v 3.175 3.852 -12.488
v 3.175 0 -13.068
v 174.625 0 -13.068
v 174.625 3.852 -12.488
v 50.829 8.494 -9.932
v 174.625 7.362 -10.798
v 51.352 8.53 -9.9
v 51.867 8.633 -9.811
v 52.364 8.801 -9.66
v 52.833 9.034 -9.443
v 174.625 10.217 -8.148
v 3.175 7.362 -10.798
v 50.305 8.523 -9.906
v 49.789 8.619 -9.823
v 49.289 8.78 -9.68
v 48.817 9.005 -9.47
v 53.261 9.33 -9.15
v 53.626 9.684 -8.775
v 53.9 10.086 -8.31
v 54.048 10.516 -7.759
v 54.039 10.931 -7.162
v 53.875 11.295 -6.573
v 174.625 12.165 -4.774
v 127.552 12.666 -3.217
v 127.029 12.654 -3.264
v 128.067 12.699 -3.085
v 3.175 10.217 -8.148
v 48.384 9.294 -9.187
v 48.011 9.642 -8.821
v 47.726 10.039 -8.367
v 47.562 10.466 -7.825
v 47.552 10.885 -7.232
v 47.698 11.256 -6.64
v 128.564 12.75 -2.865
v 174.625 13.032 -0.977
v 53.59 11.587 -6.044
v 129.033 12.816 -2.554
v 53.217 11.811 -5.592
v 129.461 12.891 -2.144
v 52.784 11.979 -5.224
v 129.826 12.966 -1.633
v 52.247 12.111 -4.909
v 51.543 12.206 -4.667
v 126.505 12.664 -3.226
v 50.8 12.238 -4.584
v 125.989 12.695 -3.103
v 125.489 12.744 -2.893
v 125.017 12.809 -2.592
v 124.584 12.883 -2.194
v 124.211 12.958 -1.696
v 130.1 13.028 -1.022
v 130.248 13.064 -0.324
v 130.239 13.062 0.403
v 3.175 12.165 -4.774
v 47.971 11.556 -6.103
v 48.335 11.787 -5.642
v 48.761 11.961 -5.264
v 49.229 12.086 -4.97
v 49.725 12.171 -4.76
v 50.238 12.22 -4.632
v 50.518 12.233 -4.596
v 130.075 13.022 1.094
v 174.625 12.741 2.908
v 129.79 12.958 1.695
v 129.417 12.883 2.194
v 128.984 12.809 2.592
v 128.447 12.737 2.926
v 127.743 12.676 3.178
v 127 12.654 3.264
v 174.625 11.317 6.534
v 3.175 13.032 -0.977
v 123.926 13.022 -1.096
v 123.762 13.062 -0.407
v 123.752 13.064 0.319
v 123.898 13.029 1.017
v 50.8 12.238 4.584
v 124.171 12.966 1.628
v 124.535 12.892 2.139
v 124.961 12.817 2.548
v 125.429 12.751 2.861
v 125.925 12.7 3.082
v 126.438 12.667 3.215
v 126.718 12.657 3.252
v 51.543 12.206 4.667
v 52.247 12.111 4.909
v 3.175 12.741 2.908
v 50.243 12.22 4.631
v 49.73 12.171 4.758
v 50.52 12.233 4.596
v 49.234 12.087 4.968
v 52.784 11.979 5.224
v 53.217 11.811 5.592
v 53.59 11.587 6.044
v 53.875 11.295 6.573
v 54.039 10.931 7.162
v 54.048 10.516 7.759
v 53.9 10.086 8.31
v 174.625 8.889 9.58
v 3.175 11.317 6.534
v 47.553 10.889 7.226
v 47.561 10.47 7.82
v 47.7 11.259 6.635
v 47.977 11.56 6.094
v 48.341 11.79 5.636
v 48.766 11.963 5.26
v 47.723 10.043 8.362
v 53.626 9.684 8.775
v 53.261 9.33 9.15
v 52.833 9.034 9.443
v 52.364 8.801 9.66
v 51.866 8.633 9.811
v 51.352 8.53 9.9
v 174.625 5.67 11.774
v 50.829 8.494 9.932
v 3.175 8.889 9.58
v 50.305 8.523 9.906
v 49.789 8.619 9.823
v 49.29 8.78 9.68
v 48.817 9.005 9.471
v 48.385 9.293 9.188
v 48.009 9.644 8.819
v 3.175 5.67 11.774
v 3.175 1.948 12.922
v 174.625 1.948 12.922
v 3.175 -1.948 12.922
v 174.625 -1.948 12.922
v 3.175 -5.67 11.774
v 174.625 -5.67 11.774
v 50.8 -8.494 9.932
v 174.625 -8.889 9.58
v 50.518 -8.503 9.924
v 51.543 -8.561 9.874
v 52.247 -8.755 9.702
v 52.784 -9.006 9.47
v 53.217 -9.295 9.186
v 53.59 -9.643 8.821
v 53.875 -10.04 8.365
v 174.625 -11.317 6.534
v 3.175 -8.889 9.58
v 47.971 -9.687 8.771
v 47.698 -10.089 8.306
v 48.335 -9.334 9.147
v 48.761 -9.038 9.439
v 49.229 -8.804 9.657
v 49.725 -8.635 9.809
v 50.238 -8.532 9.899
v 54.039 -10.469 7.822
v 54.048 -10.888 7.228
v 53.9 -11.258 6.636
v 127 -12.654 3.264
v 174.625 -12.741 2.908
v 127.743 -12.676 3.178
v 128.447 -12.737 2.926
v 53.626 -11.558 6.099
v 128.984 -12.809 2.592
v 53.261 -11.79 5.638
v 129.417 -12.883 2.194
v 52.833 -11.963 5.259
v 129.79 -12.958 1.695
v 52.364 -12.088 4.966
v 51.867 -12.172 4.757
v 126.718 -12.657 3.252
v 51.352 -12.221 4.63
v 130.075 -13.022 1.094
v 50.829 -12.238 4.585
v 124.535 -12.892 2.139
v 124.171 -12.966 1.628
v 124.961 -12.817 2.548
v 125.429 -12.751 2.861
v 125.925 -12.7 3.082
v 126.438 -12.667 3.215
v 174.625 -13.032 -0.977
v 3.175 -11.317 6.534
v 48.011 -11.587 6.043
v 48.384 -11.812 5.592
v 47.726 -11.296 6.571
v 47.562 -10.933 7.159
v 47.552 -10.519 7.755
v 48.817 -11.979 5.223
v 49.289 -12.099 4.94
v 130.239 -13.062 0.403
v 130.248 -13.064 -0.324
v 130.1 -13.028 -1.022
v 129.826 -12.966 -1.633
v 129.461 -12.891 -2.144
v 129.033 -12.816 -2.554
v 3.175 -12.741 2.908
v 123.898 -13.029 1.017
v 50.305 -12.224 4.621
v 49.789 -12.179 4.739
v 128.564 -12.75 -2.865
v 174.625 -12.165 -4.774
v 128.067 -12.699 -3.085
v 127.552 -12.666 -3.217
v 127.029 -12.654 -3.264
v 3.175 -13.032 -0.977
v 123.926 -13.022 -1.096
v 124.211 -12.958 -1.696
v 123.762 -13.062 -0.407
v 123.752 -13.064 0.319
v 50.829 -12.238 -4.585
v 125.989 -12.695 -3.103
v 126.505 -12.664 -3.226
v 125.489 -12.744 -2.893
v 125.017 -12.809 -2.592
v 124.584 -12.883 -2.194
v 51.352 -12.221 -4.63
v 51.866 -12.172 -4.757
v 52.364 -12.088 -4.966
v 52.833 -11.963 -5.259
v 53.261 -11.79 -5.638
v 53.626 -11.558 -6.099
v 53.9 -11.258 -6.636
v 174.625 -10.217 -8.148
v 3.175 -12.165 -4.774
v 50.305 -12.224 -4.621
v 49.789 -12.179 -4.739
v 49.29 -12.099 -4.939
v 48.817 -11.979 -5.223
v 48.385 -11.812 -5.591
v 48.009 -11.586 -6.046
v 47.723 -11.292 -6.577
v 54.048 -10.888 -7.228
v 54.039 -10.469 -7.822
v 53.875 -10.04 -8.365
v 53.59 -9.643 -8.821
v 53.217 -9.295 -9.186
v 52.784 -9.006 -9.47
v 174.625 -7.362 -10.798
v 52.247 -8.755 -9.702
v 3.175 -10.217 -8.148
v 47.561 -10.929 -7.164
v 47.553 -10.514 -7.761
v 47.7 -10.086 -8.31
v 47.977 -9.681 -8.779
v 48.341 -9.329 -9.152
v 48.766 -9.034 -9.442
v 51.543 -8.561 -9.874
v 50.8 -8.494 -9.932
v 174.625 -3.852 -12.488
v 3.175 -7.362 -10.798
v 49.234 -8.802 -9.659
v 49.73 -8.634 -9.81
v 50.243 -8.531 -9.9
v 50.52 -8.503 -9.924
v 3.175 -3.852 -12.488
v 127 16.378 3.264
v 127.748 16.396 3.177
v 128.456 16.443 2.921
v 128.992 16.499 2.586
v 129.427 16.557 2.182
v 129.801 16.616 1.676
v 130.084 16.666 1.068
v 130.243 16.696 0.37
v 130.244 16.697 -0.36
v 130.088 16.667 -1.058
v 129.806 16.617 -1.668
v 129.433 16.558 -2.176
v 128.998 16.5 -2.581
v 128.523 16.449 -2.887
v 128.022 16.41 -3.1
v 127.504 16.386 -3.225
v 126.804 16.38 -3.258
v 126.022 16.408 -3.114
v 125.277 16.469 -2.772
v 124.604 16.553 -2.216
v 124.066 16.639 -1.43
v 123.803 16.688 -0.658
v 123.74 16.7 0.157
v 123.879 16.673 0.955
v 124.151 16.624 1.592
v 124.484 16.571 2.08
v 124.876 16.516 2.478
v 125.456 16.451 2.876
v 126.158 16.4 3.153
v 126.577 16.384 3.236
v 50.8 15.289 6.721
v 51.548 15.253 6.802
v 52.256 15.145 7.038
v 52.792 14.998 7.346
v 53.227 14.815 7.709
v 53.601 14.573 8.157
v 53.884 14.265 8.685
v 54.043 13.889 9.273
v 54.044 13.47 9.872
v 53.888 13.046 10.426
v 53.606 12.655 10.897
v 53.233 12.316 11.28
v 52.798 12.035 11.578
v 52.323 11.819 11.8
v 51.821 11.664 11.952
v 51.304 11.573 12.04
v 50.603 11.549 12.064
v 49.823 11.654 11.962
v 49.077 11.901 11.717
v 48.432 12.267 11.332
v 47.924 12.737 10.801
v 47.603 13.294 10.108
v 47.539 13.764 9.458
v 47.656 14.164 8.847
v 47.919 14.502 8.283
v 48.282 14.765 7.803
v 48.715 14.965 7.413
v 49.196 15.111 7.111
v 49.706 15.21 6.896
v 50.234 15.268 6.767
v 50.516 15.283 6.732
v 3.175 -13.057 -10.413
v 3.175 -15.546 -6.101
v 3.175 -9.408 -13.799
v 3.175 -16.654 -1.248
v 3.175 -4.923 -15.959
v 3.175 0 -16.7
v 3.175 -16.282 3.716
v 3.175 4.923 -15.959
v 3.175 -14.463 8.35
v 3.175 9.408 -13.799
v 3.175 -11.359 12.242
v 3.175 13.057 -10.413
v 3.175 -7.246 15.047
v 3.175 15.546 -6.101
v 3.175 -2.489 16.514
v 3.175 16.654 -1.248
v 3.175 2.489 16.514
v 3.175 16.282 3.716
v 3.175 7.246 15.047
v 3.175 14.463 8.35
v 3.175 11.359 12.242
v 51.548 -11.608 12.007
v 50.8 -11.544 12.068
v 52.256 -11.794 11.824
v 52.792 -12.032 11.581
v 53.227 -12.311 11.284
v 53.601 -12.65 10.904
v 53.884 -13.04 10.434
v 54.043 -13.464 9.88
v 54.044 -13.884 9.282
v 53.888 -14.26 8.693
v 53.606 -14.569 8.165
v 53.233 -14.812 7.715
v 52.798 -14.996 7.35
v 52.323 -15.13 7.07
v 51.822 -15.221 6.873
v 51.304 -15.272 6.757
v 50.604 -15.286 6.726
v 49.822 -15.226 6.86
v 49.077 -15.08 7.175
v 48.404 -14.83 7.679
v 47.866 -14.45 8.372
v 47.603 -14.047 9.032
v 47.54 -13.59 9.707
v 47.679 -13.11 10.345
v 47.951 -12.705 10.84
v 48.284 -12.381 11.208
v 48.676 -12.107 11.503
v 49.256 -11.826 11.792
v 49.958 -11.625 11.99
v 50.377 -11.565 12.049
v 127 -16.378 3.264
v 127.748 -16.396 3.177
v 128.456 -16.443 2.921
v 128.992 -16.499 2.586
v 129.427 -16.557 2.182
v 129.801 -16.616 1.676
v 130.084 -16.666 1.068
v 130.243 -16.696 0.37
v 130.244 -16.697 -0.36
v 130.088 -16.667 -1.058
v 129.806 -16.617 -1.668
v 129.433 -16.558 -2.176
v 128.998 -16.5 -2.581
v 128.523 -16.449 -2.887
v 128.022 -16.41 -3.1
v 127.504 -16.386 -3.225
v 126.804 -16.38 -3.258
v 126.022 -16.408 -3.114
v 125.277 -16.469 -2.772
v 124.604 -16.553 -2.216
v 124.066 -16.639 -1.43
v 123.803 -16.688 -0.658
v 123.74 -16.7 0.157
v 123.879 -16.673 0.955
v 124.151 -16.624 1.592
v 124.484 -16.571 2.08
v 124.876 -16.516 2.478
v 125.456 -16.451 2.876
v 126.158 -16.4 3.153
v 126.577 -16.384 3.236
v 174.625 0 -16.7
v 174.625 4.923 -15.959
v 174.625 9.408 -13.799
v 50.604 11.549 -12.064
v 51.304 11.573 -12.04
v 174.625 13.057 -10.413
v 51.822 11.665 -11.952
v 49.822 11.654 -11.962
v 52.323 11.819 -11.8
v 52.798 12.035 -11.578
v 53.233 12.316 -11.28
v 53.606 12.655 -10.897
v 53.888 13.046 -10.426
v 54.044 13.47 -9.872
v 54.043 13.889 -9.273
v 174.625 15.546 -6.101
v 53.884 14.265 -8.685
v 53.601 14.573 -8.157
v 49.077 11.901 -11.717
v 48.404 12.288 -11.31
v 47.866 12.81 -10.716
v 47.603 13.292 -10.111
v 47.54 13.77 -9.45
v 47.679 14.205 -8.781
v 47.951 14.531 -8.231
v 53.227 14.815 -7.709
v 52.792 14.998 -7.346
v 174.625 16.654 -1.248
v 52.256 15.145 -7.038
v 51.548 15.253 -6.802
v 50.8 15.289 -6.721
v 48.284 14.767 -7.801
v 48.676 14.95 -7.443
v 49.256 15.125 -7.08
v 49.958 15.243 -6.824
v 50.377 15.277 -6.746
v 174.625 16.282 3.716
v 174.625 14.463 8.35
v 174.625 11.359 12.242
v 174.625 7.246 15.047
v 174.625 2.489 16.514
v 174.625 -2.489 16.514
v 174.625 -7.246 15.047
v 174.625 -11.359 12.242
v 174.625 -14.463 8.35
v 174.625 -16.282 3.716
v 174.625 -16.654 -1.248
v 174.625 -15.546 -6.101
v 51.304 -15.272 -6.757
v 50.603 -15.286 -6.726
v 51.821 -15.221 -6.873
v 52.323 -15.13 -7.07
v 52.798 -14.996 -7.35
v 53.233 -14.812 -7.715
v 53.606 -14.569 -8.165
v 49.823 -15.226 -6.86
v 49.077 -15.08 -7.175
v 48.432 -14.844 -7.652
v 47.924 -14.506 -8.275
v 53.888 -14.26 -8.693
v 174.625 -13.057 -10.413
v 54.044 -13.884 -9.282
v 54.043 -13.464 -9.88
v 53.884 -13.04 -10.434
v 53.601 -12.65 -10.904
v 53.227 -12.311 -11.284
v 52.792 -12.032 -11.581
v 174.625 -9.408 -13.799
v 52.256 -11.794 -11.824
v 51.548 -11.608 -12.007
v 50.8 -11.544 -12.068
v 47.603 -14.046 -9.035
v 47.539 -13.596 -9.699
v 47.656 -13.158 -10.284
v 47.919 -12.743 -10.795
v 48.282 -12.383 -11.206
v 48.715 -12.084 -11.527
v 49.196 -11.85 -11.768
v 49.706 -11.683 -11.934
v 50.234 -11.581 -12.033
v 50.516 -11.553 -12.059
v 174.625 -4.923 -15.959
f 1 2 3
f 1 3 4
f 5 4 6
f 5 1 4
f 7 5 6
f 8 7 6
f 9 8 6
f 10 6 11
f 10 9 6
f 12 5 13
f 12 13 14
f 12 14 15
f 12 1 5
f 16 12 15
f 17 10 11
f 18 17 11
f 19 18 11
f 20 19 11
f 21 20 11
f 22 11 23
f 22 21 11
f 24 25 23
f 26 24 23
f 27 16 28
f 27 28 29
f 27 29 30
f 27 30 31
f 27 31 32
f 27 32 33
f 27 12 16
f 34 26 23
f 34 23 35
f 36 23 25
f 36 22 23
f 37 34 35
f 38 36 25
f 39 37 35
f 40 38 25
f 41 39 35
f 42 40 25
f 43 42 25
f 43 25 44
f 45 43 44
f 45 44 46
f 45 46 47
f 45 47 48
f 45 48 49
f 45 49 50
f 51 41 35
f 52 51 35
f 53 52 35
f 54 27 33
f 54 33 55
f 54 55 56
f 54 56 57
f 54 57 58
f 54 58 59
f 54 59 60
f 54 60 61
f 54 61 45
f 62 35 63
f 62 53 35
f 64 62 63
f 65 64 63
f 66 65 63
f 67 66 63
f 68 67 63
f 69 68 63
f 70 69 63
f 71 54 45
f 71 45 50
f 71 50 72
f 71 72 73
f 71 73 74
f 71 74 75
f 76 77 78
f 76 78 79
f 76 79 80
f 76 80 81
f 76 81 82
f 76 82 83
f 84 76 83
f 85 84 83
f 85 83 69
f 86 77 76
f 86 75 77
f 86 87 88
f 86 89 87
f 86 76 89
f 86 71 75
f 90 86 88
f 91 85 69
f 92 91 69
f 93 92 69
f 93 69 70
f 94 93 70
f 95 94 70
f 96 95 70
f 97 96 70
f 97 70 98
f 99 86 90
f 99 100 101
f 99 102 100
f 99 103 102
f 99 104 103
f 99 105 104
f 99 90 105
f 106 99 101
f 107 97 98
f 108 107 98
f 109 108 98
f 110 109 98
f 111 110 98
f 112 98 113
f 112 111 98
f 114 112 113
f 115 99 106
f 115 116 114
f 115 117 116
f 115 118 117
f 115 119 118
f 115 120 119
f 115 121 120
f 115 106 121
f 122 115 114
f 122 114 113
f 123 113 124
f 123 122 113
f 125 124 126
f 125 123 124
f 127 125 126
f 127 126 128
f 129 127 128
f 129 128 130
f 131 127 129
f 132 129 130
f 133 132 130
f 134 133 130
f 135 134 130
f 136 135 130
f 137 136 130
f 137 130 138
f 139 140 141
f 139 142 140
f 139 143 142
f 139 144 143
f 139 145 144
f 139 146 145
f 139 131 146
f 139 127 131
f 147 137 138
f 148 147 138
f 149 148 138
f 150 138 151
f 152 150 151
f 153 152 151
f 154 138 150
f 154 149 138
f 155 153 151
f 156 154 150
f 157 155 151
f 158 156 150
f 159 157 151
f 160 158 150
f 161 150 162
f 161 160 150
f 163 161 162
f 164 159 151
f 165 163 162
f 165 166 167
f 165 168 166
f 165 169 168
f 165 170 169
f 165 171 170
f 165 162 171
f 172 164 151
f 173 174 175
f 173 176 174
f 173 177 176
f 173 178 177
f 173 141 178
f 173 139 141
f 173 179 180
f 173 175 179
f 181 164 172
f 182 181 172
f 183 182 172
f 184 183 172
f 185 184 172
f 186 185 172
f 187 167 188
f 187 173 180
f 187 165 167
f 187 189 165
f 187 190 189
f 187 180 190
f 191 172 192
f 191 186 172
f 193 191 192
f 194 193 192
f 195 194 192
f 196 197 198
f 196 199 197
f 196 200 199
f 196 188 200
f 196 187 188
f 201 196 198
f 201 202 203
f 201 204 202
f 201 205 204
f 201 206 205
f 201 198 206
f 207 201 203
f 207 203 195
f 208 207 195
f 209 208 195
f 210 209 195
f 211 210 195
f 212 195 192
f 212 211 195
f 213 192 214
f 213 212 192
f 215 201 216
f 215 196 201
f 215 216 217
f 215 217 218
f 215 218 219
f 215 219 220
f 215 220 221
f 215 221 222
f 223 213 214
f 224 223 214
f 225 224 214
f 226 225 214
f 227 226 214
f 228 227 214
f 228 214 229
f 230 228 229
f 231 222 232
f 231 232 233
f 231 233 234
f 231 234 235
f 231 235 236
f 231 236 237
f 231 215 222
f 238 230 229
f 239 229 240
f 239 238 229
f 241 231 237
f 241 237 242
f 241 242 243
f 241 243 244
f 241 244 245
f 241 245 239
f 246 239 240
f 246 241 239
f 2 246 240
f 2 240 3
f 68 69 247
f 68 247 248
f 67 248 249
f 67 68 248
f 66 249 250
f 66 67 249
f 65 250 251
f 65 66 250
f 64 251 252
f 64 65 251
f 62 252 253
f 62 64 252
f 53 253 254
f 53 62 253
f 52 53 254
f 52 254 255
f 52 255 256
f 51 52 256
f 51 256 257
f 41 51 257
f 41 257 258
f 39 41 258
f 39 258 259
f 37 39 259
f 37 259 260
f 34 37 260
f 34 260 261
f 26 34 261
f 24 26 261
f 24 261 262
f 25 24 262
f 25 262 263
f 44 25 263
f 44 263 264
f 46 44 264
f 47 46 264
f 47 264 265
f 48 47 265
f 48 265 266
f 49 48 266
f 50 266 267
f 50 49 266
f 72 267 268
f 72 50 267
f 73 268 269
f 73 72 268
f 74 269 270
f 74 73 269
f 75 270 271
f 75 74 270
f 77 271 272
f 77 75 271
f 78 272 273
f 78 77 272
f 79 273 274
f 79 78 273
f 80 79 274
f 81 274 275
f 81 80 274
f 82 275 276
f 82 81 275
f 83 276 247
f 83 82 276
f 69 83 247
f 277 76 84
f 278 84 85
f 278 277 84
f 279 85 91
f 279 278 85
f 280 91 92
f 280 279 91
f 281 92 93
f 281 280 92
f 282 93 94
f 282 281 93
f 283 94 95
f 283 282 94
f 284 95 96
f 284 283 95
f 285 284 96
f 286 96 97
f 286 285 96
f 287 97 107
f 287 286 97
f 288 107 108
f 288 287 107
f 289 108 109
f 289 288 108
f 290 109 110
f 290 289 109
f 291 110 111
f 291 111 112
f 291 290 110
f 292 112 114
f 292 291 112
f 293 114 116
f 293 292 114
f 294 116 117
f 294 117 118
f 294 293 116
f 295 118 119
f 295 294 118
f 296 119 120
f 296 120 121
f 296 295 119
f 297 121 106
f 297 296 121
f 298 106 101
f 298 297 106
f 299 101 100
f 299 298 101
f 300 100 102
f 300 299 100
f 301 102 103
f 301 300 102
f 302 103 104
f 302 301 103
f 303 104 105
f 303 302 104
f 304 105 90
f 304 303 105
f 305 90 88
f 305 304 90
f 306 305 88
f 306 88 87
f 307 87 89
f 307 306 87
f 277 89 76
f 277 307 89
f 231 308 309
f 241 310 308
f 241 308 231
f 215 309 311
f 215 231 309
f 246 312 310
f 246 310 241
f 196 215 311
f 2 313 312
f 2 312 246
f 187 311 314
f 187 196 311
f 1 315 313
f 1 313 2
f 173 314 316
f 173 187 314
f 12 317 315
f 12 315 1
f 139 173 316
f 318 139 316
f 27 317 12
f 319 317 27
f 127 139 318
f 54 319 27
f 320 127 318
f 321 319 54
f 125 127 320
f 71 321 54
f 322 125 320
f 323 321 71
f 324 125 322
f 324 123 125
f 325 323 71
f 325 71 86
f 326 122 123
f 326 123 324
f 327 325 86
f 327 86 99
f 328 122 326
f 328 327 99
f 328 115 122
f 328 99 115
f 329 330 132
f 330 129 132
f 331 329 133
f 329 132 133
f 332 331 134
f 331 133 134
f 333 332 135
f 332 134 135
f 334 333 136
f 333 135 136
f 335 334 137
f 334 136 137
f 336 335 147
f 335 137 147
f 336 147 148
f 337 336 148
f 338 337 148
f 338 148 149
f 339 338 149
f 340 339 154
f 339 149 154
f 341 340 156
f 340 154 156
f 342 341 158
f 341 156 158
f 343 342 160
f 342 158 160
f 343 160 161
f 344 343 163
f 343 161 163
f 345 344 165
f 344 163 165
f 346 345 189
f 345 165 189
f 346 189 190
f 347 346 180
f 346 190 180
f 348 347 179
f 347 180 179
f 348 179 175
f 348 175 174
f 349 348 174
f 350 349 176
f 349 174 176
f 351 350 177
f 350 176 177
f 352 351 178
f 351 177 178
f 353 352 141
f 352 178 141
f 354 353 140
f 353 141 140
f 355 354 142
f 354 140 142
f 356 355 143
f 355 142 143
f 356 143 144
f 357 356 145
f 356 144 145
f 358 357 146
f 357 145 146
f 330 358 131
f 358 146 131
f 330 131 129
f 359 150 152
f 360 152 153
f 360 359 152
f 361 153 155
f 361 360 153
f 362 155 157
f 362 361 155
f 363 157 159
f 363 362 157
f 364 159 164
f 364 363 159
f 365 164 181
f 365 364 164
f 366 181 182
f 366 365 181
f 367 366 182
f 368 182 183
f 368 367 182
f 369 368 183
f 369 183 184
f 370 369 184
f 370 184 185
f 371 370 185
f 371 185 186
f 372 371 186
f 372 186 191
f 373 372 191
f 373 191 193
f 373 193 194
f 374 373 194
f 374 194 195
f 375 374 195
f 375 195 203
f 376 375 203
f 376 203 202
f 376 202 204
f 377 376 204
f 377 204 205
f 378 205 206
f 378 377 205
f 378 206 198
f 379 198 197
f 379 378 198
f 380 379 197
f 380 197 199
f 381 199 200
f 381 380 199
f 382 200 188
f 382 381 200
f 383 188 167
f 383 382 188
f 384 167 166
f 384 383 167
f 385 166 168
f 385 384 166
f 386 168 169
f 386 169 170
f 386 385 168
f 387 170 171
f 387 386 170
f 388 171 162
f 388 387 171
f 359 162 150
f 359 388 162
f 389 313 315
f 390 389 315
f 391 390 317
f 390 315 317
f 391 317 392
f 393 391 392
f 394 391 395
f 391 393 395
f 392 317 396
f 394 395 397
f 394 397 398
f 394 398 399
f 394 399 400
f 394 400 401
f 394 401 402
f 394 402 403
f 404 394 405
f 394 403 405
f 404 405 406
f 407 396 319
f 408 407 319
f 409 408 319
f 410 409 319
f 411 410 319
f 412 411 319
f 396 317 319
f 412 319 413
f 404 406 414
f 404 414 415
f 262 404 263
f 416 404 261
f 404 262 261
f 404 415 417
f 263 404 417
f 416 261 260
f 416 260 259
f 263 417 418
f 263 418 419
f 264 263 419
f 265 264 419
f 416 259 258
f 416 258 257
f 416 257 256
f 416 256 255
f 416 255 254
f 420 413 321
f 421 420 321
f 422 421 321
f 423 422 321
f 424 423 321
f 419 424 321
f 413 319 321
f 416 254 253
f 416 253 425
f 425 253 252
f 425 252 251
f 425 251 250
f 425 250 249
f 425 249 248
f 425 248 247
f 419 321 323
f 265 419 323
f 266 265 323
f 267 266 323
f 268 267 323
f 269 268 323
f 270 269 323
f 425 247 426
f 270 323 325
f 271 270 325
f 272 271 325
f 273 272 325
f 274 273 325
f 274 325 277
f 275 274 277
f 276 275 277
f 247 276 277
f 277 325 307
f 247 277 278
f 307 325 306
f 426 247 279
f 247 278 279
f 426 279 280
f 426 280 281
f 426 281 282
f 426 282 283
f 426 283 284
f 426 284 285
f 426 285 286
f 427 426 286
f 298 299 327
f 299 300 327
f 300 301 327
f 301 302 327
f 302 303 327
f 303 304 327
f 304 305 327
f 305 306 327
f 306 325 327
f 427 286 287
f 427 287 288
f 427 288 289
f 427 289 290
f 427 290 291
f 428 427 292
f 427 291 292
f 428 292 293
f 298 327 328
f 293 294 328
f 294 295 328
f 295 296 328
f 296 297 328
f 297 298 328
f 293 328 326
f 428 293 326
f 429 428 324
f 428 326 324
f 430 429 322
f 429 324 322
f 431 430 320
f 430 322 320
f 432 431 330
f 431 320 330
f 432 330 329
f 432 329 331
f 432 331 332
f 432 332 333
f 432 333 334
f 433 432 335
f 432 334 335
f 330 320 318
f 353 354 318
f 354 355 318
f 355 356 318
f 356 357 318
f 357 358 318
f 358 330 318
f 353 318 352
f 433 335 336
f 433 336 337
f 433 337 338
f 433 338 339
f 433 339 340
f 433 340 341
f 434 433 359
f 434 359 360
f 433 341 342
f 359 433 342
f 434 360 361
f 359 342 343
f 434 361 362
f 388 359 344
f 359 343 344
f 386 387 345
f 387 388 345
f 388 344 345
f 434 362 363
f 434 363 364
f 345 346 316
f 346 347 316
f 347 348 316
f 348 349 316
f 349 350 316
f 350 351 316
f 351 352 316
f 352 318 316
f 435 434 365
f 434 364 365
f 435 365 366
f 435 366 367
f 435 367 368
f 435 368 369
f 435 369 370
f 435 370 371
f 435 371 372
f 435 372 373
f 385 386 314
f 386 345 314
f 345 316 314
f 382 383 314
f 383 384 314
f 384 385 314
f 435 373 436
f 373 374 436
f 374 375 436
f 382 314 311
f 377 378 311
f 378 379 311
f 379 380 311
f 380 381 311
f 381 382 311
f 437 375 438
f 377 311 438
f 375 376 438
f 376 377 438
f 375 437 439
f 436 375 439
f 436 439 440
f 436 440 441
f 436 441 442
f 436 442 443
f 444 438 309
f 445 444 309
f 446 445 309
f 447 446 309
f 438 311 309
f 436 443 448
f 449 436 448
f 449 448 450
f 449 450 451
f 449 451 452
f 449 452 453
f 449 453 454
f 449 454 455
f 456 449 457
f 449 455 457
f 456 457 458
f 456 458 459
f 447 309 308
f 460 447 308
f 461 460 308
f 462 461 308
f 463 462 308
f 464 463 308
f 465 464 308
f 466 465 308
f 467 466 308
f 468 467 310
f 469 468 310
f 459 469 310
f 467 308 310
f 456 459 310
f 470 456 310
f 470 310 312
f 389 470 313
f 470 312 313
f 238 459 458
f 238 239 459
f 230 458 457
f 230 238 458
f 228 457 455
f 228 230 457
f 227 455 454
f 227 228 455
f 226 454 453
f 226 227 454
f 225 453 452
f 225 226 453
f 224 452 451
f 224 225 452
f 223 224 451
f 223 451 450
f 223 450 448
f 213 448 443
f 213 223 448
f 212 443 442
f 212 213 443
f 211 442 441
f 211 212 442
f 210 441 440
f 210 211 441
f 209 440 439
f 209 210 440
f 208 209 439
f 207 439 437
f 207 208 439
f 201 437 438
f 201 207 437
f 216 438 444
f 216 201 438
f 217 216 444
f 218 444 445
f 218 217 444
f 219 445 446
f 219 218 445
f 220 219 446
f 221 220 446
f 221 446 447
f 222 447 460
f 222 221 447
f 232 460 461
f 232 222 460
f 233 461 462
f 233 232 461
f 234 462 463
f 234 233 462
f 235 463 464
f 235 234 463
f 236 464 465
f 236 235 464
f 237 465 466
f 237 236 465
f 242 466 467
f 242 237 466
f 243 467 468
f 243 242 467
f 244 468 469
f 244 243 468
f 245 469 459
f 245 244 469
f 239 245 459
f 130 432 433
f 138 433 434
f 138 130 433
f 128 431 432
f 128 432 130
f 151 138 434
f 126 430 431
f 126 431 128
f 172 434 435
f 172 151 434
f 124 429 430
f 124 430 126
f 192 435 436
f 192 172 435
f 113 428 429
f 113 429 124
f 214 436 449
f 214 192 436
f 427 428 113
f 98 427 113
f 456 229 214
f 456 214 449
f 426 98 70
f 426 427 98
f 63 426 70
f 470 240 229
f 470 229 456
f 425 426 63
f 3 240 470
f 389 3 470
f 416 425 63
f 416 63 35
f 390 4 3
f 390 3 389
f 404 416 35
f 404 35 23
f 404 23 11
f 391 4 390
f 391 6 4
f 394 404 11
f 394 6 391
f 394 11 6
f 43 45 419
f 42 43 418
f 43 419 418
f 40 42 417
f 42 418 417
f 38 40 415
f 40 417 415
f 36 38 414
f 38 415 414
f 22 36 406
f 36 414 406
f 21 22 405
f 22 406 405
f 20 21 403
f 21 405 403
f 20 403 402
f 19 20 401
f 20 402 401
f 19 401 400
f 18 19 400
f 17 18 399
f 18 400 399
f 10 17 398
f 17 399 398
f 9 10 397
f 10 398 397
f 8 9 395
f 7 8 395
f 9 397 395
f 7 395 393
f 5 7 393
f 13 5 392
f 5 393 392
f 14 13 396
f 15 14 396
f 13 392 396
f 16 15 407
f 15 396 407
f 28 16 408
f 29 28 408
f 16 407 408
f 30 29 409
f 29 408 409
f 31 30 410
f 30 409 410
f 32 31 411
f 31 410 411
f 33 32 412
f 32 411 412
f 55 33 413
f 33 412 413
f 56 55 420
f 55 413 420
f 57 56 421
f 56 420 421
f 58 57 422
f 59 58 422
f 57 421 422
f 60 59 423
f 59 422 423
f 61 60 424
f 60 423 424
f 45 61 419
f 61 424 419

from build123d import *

# Parameters (mm, degrees)
SKETCH1_R               = 16.7005
SKETCH1_R_2             = 13.0683
BOSS_EXTRUDE1_DEPTH     = 254
CUT_EXTRUDE2_DEPTH      = 256.095694594
CUT_EXTRUDE2_DEPTH_BACK = 256.095694594
SKETCH3_R               = 3.2639
SKETCH4_R               = 3.2639
CUT_EXTRUDE3_DEPTH      = 256.095694707
CUT_EXTRUDE4_START      = -79.375
SKETCH5_R               = 16.7005
CUT_EXTRUDE4_DEPTH      = 79.375
SKETCH7_R               = 16.7005
CUT_EXTRUDE6_DEPTH      = 3.175


with BuildPart() as part:
    # Sketch1 → Boss-Extrude1 (new body)
    with BuildSketch(Plane(origin=(0, 0, 0), x_dir=(0, 0, -1), z_dir=(1, 0, 0))):
        Circle(SKETCH1_R)
        Circle(SKETCH1_R_2, mode=Mode.SUBTRACT)
    extrude(amount=BOSS_EXTRUDE1_DEPTH)

    # Sketch3 → Cut-Extrude2 (cut, two sides: drawn at the far end of the back side and taken through both)
    with BuildSketch(Plane(origin=(0, 0, 0), x_dir=(1, 0, 0), z_dir=(0, 1, 0)).offset(-CUT_EXTRUDE2_DEPTH_BACK)):
        with Locations((127, 0)):
            Circle(SKETCH3_R)
    extrude(amount=CUT_EXTRUDE2_DEPTH + CUT_EXTRUDE2_DEPTH_BACK, mode=Mode.SUBTRACT)

    # Sketch4 → Cut-Extrude3 (cut, symmetric)
    with BuildSketch(Plane(origin=(0, 0, 0), x_dir=(-1, 0, 0), z_dir=(0, 0.819152044288991, -0.5735764363510473))):
        with Locations((-203.2, 0)):
            Circle(SKETCH4_R)
        with Locations((-50.8, 0)):
            Circle(SKETCH4_R)
    cut_extrude3 = extrude(amount=CUT_EXTRUDE3_DEPTH, both=True, mode=Mode.SUBTRACT)

    # Sketch5 → Cut-Extrude4 (cut)
    with BuildSketch(Plane(origin=(254, 0, 0), x_dir=(0, 0, -1), z_dir=(1, 0, 0)).offset(CUT_EXTRUDE4_START)):
        Circle(SKETCH5_R)
    extrude(amount=CUT_EXTRUDE4_DEPTH, mode=Mode.SUBTRACT)

    # Mirror1: Cut-Extrude3 across plane
    add(cut_extrude3.mirror(Plane.XY), mode=Mode.SUBTRACT)

    # Sketch7 → Cut-Extrude6 (cut)
    with BuildSketch(Plane.ZY):
        Circle(SKETCH7_R)
    extrude(amount=-CUT_EXTRUDE6_DEPTH, mode=Mode.SUBTRACT)


solid = part.part
